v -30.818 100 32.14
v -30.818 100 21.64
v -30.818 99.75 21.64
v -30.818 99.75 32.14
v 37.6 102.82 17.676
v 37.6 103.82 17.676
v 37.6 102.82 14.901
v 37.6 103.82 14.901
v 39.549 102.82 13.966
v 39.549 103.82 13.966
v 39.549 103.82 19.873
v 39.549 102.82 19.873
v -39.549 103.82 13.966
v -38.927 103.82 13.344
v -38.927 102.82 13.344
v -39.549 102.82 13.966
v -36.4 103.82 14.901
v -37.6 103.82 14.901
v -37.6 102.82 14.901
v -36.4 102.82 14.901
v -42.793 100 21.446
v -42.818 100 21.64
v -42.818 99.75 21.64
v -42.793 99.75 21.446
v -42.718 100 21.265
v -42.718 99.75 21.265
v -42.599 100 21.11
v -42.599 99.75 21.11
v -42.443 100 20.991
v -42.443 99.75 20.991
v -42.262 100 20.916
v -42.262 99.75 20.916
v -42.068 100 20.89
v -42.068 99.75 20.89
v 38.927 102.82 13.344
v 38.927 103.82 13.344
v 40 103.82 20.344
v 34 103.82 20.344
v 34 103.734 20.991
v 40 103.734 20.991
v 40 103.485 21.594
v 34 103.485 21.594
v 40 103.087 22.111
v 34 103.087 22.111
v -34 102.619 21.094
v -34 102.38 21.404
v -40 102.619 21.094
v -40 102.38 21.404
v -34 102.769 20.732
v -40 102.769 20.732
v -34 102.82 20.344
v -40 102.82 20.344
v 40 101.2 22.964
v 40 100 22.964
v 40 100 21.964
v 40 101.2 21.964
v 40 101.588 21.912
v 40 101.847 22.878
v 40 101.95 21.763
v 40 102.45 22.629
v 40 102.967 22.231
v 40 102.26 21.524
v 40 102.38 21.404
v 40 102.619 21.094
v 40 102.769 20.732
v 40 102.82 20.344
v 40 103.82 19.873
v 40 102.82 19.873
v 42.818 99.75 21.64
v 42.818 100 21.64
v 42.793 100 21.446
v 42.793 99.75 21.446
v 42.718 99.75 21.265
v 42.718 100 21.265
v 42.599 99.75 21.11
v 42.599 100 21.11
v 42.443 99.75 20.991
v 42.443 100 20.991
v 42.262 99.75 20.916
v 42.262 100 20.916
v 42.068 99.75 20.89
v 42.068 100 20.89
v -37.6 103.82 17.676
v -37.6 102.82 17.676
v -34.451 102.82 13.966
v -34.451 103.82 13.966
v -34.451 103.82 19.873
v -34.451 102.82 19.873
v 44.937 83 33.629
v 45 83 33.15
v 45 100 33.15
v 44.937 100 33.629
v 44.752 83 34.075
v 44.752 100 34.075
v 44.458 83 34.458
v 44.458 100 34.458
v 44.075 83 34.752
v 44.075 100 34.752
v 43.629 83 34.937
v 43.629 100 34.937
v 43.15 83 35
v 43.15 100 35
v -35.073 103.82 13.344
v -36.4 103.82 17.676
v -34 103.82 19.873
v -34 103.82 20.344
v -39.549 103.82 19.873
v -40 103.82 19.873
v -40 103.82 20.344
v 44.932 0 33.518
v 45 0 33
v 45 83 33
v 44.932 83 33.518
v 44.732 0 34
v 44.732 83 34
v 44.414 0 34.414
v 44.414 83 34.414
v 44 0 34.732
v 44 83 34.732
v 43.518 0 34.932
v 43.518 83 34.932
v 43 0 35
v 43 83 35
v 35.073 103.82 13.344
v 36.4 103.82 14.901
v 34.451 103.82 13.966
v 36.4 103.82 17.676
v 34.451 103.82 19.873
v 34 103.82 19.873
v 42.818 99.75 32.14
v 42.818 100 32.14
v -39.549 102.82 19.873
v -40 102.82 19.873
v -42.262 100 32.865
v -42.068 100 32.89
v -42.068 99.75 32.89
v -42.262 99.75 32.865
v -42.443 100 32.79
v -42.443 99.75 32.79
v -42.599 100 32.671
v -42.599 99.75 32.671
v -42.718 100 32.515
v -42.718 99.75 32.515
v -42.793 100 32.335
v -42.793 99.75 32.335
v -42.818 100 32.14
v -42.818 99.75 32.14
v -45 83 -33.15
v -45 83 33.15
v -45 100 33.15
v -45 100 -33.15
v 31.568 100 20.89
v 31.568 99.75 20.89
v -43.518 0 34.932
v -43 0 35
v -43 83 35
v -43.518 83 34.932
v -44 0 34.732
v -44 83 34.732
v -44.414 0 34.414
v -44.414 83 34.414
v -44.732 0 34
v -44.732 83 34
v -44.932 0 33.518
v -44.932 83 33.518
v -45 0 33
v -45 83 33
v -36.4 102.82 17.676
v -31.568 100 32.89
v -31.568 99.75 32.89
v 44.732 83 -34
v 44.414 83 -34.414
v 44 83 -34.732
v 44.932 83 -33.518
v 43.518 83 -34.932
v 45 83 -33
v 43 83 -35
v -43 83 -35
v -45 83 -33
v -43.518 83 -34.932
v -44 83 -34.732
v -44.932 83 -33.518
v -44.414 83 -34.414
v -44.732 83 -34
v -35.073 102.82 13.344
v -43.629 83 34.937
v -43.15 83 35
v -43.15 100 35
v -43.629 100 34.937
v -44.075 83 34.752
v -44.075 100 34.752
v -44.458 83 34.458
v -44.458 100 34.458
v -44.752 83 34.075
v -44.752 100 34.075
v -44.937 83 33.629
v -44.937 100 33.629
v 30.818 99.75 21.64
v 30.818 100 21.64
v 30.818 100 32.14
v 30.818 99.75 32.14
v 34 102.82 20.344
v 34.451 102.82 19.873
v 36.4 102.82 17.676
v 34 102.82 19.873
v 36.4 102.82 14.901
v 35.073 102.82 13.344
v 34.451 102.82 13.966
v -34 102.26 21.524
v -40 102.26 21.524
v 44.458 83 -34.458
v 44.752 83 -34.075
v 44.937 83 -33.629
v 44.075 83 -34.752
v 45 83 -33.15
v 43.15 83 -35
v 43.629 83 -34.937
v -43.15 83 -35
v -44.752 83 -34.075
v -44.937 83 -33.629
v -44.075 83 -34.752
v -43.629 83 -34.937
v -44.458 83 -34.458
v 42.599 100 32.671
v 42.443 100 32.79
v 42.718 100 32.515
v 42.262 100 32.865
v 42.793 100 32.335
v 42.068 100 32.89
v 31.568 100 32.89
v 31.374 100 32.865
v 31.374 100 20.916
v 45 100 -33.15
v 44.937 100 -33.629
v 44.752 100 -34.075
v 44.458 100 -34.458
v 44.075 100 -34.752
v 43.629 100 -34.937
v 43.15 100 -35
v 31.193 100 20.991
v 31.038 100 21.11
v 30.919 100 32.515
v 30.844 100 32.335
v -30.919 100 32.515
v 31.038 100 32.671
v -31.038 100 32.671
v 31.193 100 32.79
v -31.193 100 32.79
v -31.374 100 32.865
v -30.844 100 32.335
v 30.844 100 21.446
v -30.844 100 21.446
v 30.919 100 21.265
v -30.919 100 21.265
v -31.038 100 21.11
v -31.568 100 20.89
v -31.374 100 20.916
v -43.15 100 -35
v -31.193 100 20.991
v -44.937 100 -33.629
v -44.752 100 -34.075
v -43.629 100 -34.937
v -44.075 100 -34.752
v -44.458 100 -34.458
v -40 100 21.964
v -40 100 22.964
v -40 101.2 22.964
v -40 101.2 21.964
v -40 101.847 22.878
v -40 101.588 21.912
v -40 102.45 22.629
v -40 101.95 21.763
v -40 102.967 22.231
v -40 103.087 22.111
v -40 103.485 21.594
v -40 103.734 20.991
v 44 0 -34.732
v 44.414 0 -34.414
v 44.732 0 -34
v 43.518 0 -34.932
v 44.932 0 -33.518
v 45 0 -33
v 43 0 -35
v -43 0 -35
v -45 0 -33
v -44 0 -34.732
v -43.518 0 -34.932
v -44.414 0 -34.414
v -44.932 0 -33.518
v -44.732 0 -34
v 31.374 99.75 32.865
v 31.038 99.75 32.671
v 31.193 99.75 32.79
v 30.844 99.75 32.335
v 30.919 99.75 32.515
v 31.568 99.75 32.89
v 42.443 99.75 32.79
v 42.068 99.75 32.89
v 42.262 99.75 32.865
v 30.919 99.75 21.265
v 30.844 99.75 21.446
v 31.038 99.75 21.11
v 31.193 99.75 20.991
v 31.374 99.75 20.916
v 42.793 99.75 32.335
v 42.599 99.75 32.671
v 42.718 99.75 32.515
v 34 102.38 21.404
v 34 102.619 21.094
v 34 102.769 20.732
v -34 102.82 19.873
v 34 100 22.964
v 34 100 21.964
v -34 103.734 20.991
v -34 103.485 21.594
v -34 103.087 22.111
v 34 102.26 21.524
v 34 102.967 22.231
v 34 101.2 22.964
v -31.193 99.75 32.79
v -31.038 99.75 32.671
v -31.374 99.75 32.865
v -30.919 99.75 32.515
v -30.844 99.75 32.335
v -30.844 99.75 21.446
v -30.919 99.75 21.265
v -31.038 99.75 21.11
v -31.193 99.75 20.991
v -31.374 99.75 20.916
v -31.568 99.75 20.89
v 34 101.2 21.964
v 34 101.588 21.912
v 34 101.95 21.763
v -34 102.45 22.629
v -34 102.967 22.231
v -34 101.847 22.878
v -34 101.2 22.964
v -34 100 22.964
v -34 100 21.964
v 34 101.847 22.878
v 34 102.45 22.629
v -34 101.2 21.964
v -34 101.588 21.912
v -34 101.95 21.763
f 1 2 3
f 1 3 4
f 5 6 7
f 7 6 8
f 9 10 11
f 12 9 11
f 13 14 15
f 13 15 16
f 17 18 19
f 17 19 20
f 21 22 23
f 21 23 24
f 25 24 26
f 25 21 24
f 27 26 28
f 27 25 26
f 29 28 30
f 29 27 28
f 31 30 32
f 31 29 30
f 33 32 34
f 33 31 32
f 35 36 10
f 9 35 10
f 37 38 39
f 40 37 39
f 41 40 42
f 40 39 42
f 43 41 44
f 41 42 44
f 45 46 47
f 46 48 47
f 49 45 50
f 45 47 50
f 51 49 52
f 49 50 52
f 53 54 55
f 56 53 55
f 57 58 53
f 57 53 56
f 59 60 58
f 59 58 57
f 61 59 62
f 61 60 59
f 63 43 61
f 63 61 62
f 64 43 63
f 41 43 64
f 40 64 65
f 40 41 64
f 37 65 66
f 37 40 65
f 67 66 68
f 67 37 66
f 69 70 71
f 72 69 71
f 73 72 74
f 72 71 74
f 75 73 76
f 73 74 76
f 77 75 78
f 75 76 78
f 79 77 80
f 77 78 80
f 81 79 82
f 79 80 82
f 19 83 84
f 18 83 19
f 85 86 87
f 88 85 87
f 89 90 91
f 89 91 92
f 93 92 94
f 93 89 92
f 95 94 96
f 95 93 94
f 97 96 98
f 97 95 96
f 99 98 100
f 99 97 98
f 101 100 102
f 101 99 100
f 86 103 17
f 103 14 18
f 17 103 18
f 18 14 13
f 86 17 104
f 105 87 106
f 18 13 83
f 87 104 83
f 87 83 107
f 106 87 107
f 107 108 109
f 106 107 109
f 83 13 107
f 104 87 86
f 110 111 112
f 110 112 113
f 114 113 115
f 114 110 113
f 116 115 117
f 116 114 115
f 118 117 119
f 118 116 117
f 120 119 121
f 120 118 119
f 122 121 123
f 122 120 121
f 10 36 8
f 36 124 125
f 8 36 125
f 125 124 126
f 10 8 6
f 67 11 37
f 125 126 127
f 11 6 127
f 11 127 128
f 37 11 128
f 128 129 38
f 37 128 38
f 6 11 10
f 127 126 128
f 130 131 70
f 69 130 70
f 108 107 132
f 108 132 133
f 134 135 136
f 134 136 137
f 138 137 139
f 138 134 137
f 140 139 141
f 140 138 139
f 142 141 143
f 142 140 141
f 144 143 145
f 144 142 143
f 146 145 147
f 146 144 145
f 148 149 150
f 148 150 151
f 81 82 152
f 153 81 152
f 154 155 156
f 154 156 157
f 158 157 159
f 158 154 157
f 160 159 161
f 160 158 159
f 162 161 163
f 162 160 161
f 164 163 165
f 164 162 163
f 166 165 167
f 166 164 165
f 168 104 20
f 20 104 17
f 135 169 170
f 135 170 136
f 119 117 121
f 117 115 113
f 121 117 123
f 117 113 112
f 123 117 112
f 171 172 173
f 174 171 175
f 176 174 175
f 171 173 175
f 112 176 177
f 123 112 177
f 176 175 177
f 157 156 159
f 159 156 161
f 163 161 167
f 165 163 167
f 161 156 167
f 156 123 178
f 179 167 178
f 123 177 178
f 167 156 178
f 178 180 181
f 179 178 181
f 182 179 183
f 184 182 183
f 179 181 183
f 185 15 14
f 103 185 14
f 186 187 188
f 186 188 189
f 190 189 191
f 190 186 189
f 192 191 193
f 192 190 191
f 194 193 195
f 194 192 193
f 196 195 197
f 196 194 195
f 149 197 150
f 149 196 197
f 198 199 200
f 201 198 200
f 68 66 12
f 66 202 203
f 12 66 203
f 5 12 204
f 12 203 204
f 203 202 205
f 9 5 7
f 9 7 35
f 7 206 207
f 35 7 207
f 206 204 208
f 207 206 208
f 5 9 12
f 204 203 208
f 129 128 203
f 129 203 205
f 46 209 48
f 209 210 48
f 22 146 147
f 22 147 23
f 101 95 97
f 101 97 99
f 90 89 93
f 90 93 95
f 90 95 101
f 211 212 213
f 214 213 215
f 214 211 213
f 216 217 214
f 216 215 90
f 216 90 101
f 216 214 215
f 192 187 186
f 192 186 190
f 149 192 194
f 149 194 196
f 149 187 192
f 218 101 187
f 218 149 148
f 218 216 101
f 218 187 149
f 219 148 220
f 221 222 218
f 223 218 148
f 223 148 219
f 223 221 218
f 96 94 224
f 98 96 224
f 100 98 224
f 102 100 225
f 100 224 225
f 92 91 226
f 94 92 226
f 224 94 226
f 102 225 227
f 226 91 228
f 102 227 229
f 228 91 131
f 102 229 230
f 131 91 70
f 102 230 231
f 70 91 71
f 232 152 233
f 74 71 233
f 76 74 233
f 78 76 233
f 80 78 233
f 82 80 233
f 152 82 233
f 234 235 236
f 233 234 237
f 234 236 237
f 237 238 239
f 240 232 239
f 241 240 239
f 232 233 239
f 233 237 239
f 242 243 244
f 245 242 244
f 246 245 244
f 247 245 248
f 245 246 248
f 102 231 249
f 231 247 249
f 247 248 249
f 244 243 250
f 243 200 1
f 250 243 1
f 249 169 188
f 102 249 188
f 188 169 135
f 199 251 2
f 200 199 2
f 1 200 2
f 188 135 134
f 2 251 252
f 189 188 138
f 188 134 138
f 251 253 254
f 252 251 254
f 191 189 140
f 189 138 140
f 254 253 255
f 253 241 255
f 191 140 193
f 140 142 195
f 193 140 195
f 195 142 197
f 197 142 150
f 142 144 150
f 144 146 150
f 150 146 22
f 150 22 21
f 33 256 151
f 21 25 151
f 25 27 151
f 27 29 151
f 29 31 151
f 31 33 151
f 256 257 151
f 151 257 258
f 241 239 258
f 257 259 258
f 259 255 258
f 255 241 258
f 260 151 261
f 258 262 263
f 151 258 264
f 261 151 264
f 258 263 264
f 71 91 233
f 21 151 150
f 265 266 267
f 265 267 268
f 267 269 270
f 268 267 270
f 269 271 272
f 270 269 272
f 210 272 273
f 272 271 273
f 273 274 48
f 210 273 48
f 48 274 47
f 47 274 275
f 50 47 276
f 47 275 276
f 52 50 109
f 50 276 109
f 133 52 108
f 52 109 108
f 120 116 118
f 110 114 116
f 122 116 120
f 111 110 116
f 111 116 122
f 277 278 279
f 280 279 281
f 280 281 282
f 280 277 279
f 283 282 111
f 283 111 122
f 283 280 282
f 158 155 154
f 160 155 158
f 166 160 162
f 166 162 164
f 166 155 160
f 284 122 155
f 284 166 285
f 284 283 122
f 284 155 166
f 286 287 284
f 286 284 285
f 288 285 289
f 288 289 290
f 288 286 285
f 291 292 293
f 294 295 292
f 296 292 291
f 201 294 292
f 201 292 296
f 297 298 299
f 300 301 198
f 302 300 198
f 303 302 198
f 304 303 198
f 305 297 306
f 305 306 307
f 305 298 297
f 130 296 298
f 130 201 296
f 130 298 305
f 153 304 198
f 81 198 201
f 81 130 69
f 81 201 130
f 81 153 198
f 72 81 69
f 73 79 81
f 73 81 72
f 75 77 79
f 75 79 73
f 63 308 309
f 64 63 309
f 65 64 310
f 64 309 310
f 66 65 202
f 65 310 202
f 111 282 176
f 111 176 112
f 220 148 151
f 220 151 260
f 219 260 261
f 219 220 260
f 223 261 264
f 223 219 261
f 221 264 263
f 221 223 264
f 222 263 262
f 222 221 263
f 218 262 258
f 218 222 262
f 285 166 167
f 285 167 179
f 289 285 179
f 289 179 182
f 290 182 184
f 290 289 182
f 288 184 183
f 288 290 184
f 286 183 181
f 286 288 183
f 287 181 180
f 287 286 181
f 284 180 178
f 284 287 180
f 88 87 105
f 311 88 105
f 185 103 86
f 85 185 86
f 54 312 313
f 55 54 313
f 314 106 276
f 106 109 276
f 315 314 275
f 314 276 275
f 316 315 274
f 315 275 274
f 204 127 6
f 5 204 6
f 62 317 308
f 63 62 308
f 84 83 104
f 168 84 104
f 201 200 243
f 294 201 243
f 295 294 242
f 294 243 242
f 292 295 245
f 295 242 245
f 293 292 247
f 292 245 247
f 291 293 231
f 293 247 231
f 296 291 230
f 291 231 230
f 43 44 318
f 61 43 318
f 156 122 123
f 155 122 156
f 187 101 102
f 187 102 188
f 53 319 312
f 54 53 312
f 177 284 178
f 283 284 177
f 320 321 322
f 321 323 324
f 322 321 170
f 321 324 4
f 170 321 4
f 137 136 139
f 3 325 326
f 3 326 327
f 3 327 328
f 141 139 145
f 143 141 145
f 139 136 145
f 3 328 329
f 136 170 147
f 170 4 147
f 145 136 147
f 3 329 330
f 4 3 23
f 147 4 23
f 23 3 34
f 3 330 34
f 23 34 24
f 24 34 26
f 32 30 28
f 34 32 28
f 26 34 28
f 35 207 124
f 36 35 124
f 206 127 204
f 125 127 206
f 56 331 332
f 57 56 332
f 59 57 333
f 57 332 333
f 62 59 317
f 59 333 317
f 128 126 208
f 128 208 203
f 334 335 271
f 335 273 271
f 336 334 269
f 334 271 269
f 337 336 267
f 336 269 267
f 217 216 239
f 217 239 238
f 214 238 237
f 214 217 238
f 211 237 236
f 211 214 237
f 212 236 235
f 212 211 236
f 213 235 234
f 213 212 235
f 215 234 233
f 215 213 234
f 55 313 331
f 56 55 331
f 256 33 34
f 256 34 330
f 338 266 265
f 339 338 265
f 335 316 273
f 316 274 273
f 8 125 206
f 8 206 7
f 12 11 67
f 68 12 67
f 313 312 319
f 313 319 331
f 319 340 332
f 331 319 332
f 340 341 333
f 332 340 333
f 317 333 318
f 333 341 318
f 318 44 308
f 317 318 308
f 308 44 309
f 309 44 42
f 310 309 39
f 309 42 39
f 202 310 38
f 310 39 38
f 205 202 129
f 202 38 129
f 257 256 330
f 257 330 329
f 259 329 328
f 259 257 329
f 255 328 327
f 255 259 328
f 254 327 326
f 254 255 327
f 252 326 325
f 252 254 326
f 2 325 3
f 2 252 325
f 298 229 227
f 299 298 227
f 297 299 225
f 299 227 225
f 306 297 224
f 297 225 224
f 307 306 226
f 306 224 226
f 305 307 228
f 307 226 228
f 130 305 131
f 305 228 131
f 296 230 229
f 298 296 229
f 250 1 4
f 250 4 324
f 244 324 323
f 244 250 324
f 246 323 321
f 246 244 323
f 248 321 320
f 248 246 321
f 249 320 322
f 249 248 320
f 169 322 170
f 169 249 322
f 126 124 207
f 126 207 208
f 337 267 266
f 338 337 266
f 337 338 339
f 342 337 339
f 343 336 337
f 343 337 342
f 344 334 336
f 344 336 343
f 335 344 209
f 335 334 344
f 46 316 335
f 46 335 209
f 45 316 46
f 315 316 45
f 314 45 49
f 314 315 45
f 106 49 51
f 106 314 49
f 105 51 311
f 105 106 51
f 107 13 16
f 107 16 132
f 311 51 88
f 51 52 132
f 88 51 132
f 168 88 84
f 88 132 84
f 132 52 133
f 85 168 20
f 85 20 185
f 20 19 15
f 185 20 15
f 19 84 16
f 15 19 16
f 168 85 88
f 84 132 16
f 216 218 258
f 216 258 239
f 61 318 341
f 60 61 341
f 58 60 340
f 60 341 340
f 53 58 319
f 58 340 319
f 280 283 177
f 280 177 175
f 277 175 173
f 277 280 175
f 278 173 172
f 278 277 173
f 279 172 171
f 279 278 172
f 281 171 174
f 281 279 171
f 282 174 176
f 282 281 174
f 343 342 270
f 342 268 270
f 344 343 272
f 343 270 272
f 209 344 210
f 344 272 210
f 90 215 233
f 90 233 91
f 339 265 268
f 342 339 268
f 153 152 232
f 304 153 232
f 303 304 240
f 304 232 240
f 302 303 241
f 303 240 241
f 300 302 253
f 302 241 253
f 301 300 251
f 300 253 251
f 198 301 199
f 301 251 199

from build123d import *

# Parameters (mm, degrees)
BOSS_EXTRUDE1_DEPTH = 83
BOSS_EXTRUDE2_DEPTH = 17
CUT_EXTRUDE1_DEPTH  = 0.5
BOSS_EXTRUDE3_DEPTH = 0.25
EXTRUDE_THIN1_DEPTH = 3
EXTRUDE_THIN2_DEPTH = 6
SKETCH10_W          = 1.2
SKETCH10_H          = 2.775138775
CUT_EXTRUDE2_DEPTH  = 1


with BuildPart() as part:
    # Sketch1 → Boss-Extrude1 (new body)
    with BuildSketch(Plane(origin=(0, 0, 0), x_dir=(1, 0, 0), z_dir=(0, 1, 0))):
        with BuildLine():
            Line((-43, 35), (43, 35))
            ThreePointArc((43, 35), (44.414213562, 34.414213562), (45, 33))
            Line((45, 33), (45, -33))
            ThreePointArc((45, -33), (44.414213562, -34.414213562), (43, -35))
            Line((43, -35), (-43, -35))
            ThreePointArc((-43, -35), (-44.414213562, -34.414213562), (-45, -33))
            Line((-45, -33), (-45, 33))
            ThreePointArc((-45, 33), (-44.414213562, 34.414213562), (-43, 35))
        make_face()
    extrude(amount=BOSS_EXTRUDE1_DEPTH)


with BuildPart() as body_2:
    # Sketch2 → Boss-Extrude2 (new body)
    with BuildSketch(Plane(origin=(0, 83, 0), x_dir=(1, 0, 0), z_dir=(0, 1, 0))):
        with BuildLine():
            Line((-43.15, 35), (43.15, 35))
            ThreePointArc((43.15, 35), (44.458147545, 34.458147545), (45, 33.15))
            Line((45, 33.15), (45, -33.15))
            ThreePointArc((45, -33.15), (44.458147545, -34.458147545), (43.15, -35))
            Line((43.15, -35), (-43.15, -35))
            ThreePointArc((-43.15, -35), (-44.458147545, -34.458147545), (-45, -33.15))
            Line((-45, -33.15), (-45, 33.15))
            ThreePointArc((-45, 33.15), (-44.458147545, 34.458147545), (-43.15, 35))
        make_face()
    extrude(amount=BOSS_EXTRUDE2_DEPTH)

    # Sketch3 → Cut-Extrude1 (cut)
    with BuildSketch(Plane(origin=(0, 100, 0), x_dir=(1, 0, 0), z_dir=(0, 1, 0))):
        with BuildLine():
            Line((-42.0683073, -20.890429663), (-31.5683073, -20.890429663))
            ThreePointArc((-31.5683073, -20.890429663), (-31.037977214, -21.110099577), (-30.8183073, -21.640429663))
            Line((-30.8183073, -21.640429663), (-30.8183073, -32.140429663))
            ThreePointArc((-30.8183073, -32.140429663), (-31.037977214, -32.670759749), (-31.5683073, -32.890429663))
            Line((-31.5683073, -32.890429663), (-42.0683073, -32.890429663))
            ThreePointArc((-42.0683073, -32.890429663), (-42.598637386, -32.670759749), (-42.8183073, -32.140429663))
            Line((-42.8183073, -32.140429663), (-42.8183073, -21.640429663))
            ThreePointArc((-42.8183073, -21.640429663), (-42.598637386, -21.110099577), (-42.0683073, -20.890429663))
        make_face()
        with BuildLine():
            Line((30.8183073, -21.640429663), (30.8183073, -32.140429663))
            ThreePointArc((30.8183073, -32.140429663), (31.037977214, -32.670759749), (31.5683073, -32.890429663))
            Line((31.5683073, -32.890429663), (42.0683073, -32.890429663))
            ThreePointArc((42.0683073, -32.890429663), (42.598637386, -32.670759749), (42.8183073, -32.140429663))
            Line((42.8183073, -32.140429663), (42.8183073, -21.640429663))
            ThreePointArc((42.8183073, -21.640429663), (42.598637386, -21.110099577), (42.0683073, -20.890429663))
            Line((42.0683073, -20.890429663), (31.5683073, -20.890429663))
            ThreePointArc((31.5683073, -20.890429663), (31.037977214, -21.110099577), (30.8183073, -21.640429663))
        make_face()
    extrude(amount=-CUT_EXTRUDE1_DEPTH, mode=Mode.SUBTRACT)

    # Sketch5 → Boss-Extrude3 (add)
    with BuildSketch(Plane(origin=(0, 99.5, 0), x_dir=(1, 0, 0), z_dir=(0, 1, 0))):
        with BuildLine():
            Line((-42.0683073, -20.890429663), (-31.5683073, -20.890429663))
            ThreePointArc((-31.5683073, -20.890429663), (-31.037977214, -21.110099577), (-30.8183073, -21.640429663))
            Line((-30.8183073, -21.640429663), (-30.8183073, -32.140429663))
            ThreePointArc((-30.8183073, -32.140429663), (-31.037977214, -32.670759749), (-31.5683073, -32.890429663))
            Line((-31.5683073, -32.890429663), (-42.0683073, -32.890429663))
            ThreePointArc((-42.0683073, -32.890429663), (-42.598637386, -32.670759749), (-42.8183073, -32.140429663))
            Line((-42.8183073, -32.140429663), (-42.8183073, -21.640429663))
            ThreePointArc((-42.8183073, -21.640429663), (-42.598637386, -21.110099577), (-42.0683073, -20.890429663))
        make_face()
        with BuildLine():
            Line((30.8183073, -21.640429663), (30.8183073, -32.140429663))
            ThreePointArc((30.8183073, -32.140429663), (31.037977214, -32.670759749), (31.5683073, -32.890429663))
            Line((31.5683073, -32.890429663), (42.0683073, -32.890429663))
            ThreePointArc((42.0683073, -32.890429663), (42.598637386, -32.670759749), (42.8183073, -32.140429663))
            Line((42.8183073, -32.140429663), (42.8183073, -21.640429663))
            ThreePointArc((42.8183073, -21.640429663), (42.598637386, -21.110099577), (42.0683073, -20.890429663))
            Line((42.0683073, -20.890429663), (31.5683073, -20.890429663))
            ThreePointArc((31.5683073, -20.890429663), (31.037977214, -21.110099577), (30.8183073, -21.640429663))
        make_face()
    extrude(amount=BOSS_EXTRUDE3_DEPTH)


with BuildPart() as body_3:
    # Sketch6 → Extrude-Thin1 (new, symmetric)
    with BuildSketch(Plane.ZY.offset(37)):
        with BuildLine():
            Line((21.963554927, 100), (21.963554927, 101.199727134))
            ThreePointArc((21.963554927, 101.199727134), (21.849374226, 101.773752283), (21.524215099, 102.260387306))
            Line((21.524215099, 102.260387306), (21.404257952, 102.380344453))
            ThreePointArc((21.404257952, 102.380344453), (20.917622929, 102.70550358), (20.34359778, 102.819684281))
            Line((20.34359778, 102.819684281), (13.34359778, 102.819684281))
            Line((13.34359778, 102.819684281), (13.34359778, 103.819684281))
            Line((13.34359778, 103.819684281), (20.34359778, 103.819684281))
            ThreePointArc((20.34359778, 103.819684281), (21.300306361, 103.629383113), (22.111364733, 103.087451234))
            Line((22.111364733, 103.087451234), (22.23132188, 102.967494087))
            ThreePointArc((22.23132188, 102.967494087), (22.773253759, 102.156435715), (22.963554927, 101.199727134))
            Line((22.963554927, 101.199727134), (22.963554927, 100))
            Line((22.963554927, 100), (21.963554927, 100))
        make_face()
    extrude(amount=EXTRUDE_THIN1_DEPTH, both=True)


with BuildPart() as body_4:
    # Sketch9 → Extrude-Thin2 (new body)
    with BuildSketch(Plane(origin=(34, 0, 0), x_dir=(0, 0, -1), z_dir=(1, 0, 0))):
        with BuildLine():
            Line((-21.963554927, 100), (-21.963554927, 101.199727134))
            ThreePointArc((-21.963554927, 101.199727134), (-21.849374226, 101.773752283), (-21.524215099, 102.260387306))
            Line((-21.524215099, 102.260387306), (-21.404257952, 102.380344453))
            ThreePointArc((-21.404257952, 102.380344453), (-20.917622929, 102.70550358), (-20.34359778, 102.819684281))
            Line((-20.34359778, 102.819684281), (-13.34359778, 102.819684281))
            Line((-13.34359778, 102.819684281), (-13.34359778, 103.819684281))
            Line((-13.34359778, 103.819684281), (-20.34359778, 103.819684281))
            ThreePointArc((-20.34359778, 103.819684281), (-21.300306361, 103.629383113), (-22.111364733, 103.087451234))
            Line((-22.111364733, 103.087451234), (-22.23132188, 102.967494087))
            ThreePointArc((-22.23132188, 102.967494087), (-22.773253759, 102.156435715), (-22.963554927, 101.199727134))
            Line((-22.963554927, 101.199727134), (-22.963554927, 100))
            Line((-22.963554927, 100), (-21.963554927, 100))
        make_face()
    extrude(amount=EXTRUDE_THIN2_DEPTH)


with BuildPart() as cut_extrude2_tool:
    # Sketch10 → Cut-Extrude2 (new body)
    with BuildSketch(Plane(origin=(0, 103.819684281, 0), x_dir=(1, 0, 0), z_dir=(0, 1, 0))):
        Polygon((-38.926975524, -13.34359778), (-39.549475921, -13.966098177), (-39.549475921, -19.873464752), (-40, -19.873464752), (-40, -13.34359778), align=None)
        Polygon((-34, -13.34359778), (-35.073024476, -13.34359778), (-34.450524079, -13.966098177), (-34.450524079, -19.873464752), (-34, -19.873464752), align=None)
        with Locations((-37, -16.288207362)):
            Rectangle(SKETCH10_W, SKETCH10_H)
        with Locations((37, -16.288207362)):
            Rectangle(SKETCH10_W, SKETCH10_H)
        Polygon((35.073024476, -13.34359778), (34.450524079, -13.966098177), (34.450524079, -19.873464752), (34, -19.873464752), (34, -13.34359778), align=None)
        Polygon((40, -13.34359778), (38.926975524, -13.34359778), (39.549475921, -13.966098177), (39.549475921, -19.873464752), (40, -19.873464752), align=None)
    extrude(amount=-CUT_EXTRUDE2_DEPTH)


with BuildPart() as body_3_1:
    add(body_3.part)

    # Cut-Extrude2: cut by cut_extrude2_tool
    add(cut_extrude2_tool.part, mode=Mode.SUBTRACT)


with BuildPart() as body_4_1:
    add(body_4.part)

    # Cut-Extrude2: cut by cut_extrude2_tool
    add(cut_extrude2_tool.part, mode=Mode.SUBTRACT)


solid = Compound([part.part, body_2.part, body_3_1.part, body_4_1.part])
